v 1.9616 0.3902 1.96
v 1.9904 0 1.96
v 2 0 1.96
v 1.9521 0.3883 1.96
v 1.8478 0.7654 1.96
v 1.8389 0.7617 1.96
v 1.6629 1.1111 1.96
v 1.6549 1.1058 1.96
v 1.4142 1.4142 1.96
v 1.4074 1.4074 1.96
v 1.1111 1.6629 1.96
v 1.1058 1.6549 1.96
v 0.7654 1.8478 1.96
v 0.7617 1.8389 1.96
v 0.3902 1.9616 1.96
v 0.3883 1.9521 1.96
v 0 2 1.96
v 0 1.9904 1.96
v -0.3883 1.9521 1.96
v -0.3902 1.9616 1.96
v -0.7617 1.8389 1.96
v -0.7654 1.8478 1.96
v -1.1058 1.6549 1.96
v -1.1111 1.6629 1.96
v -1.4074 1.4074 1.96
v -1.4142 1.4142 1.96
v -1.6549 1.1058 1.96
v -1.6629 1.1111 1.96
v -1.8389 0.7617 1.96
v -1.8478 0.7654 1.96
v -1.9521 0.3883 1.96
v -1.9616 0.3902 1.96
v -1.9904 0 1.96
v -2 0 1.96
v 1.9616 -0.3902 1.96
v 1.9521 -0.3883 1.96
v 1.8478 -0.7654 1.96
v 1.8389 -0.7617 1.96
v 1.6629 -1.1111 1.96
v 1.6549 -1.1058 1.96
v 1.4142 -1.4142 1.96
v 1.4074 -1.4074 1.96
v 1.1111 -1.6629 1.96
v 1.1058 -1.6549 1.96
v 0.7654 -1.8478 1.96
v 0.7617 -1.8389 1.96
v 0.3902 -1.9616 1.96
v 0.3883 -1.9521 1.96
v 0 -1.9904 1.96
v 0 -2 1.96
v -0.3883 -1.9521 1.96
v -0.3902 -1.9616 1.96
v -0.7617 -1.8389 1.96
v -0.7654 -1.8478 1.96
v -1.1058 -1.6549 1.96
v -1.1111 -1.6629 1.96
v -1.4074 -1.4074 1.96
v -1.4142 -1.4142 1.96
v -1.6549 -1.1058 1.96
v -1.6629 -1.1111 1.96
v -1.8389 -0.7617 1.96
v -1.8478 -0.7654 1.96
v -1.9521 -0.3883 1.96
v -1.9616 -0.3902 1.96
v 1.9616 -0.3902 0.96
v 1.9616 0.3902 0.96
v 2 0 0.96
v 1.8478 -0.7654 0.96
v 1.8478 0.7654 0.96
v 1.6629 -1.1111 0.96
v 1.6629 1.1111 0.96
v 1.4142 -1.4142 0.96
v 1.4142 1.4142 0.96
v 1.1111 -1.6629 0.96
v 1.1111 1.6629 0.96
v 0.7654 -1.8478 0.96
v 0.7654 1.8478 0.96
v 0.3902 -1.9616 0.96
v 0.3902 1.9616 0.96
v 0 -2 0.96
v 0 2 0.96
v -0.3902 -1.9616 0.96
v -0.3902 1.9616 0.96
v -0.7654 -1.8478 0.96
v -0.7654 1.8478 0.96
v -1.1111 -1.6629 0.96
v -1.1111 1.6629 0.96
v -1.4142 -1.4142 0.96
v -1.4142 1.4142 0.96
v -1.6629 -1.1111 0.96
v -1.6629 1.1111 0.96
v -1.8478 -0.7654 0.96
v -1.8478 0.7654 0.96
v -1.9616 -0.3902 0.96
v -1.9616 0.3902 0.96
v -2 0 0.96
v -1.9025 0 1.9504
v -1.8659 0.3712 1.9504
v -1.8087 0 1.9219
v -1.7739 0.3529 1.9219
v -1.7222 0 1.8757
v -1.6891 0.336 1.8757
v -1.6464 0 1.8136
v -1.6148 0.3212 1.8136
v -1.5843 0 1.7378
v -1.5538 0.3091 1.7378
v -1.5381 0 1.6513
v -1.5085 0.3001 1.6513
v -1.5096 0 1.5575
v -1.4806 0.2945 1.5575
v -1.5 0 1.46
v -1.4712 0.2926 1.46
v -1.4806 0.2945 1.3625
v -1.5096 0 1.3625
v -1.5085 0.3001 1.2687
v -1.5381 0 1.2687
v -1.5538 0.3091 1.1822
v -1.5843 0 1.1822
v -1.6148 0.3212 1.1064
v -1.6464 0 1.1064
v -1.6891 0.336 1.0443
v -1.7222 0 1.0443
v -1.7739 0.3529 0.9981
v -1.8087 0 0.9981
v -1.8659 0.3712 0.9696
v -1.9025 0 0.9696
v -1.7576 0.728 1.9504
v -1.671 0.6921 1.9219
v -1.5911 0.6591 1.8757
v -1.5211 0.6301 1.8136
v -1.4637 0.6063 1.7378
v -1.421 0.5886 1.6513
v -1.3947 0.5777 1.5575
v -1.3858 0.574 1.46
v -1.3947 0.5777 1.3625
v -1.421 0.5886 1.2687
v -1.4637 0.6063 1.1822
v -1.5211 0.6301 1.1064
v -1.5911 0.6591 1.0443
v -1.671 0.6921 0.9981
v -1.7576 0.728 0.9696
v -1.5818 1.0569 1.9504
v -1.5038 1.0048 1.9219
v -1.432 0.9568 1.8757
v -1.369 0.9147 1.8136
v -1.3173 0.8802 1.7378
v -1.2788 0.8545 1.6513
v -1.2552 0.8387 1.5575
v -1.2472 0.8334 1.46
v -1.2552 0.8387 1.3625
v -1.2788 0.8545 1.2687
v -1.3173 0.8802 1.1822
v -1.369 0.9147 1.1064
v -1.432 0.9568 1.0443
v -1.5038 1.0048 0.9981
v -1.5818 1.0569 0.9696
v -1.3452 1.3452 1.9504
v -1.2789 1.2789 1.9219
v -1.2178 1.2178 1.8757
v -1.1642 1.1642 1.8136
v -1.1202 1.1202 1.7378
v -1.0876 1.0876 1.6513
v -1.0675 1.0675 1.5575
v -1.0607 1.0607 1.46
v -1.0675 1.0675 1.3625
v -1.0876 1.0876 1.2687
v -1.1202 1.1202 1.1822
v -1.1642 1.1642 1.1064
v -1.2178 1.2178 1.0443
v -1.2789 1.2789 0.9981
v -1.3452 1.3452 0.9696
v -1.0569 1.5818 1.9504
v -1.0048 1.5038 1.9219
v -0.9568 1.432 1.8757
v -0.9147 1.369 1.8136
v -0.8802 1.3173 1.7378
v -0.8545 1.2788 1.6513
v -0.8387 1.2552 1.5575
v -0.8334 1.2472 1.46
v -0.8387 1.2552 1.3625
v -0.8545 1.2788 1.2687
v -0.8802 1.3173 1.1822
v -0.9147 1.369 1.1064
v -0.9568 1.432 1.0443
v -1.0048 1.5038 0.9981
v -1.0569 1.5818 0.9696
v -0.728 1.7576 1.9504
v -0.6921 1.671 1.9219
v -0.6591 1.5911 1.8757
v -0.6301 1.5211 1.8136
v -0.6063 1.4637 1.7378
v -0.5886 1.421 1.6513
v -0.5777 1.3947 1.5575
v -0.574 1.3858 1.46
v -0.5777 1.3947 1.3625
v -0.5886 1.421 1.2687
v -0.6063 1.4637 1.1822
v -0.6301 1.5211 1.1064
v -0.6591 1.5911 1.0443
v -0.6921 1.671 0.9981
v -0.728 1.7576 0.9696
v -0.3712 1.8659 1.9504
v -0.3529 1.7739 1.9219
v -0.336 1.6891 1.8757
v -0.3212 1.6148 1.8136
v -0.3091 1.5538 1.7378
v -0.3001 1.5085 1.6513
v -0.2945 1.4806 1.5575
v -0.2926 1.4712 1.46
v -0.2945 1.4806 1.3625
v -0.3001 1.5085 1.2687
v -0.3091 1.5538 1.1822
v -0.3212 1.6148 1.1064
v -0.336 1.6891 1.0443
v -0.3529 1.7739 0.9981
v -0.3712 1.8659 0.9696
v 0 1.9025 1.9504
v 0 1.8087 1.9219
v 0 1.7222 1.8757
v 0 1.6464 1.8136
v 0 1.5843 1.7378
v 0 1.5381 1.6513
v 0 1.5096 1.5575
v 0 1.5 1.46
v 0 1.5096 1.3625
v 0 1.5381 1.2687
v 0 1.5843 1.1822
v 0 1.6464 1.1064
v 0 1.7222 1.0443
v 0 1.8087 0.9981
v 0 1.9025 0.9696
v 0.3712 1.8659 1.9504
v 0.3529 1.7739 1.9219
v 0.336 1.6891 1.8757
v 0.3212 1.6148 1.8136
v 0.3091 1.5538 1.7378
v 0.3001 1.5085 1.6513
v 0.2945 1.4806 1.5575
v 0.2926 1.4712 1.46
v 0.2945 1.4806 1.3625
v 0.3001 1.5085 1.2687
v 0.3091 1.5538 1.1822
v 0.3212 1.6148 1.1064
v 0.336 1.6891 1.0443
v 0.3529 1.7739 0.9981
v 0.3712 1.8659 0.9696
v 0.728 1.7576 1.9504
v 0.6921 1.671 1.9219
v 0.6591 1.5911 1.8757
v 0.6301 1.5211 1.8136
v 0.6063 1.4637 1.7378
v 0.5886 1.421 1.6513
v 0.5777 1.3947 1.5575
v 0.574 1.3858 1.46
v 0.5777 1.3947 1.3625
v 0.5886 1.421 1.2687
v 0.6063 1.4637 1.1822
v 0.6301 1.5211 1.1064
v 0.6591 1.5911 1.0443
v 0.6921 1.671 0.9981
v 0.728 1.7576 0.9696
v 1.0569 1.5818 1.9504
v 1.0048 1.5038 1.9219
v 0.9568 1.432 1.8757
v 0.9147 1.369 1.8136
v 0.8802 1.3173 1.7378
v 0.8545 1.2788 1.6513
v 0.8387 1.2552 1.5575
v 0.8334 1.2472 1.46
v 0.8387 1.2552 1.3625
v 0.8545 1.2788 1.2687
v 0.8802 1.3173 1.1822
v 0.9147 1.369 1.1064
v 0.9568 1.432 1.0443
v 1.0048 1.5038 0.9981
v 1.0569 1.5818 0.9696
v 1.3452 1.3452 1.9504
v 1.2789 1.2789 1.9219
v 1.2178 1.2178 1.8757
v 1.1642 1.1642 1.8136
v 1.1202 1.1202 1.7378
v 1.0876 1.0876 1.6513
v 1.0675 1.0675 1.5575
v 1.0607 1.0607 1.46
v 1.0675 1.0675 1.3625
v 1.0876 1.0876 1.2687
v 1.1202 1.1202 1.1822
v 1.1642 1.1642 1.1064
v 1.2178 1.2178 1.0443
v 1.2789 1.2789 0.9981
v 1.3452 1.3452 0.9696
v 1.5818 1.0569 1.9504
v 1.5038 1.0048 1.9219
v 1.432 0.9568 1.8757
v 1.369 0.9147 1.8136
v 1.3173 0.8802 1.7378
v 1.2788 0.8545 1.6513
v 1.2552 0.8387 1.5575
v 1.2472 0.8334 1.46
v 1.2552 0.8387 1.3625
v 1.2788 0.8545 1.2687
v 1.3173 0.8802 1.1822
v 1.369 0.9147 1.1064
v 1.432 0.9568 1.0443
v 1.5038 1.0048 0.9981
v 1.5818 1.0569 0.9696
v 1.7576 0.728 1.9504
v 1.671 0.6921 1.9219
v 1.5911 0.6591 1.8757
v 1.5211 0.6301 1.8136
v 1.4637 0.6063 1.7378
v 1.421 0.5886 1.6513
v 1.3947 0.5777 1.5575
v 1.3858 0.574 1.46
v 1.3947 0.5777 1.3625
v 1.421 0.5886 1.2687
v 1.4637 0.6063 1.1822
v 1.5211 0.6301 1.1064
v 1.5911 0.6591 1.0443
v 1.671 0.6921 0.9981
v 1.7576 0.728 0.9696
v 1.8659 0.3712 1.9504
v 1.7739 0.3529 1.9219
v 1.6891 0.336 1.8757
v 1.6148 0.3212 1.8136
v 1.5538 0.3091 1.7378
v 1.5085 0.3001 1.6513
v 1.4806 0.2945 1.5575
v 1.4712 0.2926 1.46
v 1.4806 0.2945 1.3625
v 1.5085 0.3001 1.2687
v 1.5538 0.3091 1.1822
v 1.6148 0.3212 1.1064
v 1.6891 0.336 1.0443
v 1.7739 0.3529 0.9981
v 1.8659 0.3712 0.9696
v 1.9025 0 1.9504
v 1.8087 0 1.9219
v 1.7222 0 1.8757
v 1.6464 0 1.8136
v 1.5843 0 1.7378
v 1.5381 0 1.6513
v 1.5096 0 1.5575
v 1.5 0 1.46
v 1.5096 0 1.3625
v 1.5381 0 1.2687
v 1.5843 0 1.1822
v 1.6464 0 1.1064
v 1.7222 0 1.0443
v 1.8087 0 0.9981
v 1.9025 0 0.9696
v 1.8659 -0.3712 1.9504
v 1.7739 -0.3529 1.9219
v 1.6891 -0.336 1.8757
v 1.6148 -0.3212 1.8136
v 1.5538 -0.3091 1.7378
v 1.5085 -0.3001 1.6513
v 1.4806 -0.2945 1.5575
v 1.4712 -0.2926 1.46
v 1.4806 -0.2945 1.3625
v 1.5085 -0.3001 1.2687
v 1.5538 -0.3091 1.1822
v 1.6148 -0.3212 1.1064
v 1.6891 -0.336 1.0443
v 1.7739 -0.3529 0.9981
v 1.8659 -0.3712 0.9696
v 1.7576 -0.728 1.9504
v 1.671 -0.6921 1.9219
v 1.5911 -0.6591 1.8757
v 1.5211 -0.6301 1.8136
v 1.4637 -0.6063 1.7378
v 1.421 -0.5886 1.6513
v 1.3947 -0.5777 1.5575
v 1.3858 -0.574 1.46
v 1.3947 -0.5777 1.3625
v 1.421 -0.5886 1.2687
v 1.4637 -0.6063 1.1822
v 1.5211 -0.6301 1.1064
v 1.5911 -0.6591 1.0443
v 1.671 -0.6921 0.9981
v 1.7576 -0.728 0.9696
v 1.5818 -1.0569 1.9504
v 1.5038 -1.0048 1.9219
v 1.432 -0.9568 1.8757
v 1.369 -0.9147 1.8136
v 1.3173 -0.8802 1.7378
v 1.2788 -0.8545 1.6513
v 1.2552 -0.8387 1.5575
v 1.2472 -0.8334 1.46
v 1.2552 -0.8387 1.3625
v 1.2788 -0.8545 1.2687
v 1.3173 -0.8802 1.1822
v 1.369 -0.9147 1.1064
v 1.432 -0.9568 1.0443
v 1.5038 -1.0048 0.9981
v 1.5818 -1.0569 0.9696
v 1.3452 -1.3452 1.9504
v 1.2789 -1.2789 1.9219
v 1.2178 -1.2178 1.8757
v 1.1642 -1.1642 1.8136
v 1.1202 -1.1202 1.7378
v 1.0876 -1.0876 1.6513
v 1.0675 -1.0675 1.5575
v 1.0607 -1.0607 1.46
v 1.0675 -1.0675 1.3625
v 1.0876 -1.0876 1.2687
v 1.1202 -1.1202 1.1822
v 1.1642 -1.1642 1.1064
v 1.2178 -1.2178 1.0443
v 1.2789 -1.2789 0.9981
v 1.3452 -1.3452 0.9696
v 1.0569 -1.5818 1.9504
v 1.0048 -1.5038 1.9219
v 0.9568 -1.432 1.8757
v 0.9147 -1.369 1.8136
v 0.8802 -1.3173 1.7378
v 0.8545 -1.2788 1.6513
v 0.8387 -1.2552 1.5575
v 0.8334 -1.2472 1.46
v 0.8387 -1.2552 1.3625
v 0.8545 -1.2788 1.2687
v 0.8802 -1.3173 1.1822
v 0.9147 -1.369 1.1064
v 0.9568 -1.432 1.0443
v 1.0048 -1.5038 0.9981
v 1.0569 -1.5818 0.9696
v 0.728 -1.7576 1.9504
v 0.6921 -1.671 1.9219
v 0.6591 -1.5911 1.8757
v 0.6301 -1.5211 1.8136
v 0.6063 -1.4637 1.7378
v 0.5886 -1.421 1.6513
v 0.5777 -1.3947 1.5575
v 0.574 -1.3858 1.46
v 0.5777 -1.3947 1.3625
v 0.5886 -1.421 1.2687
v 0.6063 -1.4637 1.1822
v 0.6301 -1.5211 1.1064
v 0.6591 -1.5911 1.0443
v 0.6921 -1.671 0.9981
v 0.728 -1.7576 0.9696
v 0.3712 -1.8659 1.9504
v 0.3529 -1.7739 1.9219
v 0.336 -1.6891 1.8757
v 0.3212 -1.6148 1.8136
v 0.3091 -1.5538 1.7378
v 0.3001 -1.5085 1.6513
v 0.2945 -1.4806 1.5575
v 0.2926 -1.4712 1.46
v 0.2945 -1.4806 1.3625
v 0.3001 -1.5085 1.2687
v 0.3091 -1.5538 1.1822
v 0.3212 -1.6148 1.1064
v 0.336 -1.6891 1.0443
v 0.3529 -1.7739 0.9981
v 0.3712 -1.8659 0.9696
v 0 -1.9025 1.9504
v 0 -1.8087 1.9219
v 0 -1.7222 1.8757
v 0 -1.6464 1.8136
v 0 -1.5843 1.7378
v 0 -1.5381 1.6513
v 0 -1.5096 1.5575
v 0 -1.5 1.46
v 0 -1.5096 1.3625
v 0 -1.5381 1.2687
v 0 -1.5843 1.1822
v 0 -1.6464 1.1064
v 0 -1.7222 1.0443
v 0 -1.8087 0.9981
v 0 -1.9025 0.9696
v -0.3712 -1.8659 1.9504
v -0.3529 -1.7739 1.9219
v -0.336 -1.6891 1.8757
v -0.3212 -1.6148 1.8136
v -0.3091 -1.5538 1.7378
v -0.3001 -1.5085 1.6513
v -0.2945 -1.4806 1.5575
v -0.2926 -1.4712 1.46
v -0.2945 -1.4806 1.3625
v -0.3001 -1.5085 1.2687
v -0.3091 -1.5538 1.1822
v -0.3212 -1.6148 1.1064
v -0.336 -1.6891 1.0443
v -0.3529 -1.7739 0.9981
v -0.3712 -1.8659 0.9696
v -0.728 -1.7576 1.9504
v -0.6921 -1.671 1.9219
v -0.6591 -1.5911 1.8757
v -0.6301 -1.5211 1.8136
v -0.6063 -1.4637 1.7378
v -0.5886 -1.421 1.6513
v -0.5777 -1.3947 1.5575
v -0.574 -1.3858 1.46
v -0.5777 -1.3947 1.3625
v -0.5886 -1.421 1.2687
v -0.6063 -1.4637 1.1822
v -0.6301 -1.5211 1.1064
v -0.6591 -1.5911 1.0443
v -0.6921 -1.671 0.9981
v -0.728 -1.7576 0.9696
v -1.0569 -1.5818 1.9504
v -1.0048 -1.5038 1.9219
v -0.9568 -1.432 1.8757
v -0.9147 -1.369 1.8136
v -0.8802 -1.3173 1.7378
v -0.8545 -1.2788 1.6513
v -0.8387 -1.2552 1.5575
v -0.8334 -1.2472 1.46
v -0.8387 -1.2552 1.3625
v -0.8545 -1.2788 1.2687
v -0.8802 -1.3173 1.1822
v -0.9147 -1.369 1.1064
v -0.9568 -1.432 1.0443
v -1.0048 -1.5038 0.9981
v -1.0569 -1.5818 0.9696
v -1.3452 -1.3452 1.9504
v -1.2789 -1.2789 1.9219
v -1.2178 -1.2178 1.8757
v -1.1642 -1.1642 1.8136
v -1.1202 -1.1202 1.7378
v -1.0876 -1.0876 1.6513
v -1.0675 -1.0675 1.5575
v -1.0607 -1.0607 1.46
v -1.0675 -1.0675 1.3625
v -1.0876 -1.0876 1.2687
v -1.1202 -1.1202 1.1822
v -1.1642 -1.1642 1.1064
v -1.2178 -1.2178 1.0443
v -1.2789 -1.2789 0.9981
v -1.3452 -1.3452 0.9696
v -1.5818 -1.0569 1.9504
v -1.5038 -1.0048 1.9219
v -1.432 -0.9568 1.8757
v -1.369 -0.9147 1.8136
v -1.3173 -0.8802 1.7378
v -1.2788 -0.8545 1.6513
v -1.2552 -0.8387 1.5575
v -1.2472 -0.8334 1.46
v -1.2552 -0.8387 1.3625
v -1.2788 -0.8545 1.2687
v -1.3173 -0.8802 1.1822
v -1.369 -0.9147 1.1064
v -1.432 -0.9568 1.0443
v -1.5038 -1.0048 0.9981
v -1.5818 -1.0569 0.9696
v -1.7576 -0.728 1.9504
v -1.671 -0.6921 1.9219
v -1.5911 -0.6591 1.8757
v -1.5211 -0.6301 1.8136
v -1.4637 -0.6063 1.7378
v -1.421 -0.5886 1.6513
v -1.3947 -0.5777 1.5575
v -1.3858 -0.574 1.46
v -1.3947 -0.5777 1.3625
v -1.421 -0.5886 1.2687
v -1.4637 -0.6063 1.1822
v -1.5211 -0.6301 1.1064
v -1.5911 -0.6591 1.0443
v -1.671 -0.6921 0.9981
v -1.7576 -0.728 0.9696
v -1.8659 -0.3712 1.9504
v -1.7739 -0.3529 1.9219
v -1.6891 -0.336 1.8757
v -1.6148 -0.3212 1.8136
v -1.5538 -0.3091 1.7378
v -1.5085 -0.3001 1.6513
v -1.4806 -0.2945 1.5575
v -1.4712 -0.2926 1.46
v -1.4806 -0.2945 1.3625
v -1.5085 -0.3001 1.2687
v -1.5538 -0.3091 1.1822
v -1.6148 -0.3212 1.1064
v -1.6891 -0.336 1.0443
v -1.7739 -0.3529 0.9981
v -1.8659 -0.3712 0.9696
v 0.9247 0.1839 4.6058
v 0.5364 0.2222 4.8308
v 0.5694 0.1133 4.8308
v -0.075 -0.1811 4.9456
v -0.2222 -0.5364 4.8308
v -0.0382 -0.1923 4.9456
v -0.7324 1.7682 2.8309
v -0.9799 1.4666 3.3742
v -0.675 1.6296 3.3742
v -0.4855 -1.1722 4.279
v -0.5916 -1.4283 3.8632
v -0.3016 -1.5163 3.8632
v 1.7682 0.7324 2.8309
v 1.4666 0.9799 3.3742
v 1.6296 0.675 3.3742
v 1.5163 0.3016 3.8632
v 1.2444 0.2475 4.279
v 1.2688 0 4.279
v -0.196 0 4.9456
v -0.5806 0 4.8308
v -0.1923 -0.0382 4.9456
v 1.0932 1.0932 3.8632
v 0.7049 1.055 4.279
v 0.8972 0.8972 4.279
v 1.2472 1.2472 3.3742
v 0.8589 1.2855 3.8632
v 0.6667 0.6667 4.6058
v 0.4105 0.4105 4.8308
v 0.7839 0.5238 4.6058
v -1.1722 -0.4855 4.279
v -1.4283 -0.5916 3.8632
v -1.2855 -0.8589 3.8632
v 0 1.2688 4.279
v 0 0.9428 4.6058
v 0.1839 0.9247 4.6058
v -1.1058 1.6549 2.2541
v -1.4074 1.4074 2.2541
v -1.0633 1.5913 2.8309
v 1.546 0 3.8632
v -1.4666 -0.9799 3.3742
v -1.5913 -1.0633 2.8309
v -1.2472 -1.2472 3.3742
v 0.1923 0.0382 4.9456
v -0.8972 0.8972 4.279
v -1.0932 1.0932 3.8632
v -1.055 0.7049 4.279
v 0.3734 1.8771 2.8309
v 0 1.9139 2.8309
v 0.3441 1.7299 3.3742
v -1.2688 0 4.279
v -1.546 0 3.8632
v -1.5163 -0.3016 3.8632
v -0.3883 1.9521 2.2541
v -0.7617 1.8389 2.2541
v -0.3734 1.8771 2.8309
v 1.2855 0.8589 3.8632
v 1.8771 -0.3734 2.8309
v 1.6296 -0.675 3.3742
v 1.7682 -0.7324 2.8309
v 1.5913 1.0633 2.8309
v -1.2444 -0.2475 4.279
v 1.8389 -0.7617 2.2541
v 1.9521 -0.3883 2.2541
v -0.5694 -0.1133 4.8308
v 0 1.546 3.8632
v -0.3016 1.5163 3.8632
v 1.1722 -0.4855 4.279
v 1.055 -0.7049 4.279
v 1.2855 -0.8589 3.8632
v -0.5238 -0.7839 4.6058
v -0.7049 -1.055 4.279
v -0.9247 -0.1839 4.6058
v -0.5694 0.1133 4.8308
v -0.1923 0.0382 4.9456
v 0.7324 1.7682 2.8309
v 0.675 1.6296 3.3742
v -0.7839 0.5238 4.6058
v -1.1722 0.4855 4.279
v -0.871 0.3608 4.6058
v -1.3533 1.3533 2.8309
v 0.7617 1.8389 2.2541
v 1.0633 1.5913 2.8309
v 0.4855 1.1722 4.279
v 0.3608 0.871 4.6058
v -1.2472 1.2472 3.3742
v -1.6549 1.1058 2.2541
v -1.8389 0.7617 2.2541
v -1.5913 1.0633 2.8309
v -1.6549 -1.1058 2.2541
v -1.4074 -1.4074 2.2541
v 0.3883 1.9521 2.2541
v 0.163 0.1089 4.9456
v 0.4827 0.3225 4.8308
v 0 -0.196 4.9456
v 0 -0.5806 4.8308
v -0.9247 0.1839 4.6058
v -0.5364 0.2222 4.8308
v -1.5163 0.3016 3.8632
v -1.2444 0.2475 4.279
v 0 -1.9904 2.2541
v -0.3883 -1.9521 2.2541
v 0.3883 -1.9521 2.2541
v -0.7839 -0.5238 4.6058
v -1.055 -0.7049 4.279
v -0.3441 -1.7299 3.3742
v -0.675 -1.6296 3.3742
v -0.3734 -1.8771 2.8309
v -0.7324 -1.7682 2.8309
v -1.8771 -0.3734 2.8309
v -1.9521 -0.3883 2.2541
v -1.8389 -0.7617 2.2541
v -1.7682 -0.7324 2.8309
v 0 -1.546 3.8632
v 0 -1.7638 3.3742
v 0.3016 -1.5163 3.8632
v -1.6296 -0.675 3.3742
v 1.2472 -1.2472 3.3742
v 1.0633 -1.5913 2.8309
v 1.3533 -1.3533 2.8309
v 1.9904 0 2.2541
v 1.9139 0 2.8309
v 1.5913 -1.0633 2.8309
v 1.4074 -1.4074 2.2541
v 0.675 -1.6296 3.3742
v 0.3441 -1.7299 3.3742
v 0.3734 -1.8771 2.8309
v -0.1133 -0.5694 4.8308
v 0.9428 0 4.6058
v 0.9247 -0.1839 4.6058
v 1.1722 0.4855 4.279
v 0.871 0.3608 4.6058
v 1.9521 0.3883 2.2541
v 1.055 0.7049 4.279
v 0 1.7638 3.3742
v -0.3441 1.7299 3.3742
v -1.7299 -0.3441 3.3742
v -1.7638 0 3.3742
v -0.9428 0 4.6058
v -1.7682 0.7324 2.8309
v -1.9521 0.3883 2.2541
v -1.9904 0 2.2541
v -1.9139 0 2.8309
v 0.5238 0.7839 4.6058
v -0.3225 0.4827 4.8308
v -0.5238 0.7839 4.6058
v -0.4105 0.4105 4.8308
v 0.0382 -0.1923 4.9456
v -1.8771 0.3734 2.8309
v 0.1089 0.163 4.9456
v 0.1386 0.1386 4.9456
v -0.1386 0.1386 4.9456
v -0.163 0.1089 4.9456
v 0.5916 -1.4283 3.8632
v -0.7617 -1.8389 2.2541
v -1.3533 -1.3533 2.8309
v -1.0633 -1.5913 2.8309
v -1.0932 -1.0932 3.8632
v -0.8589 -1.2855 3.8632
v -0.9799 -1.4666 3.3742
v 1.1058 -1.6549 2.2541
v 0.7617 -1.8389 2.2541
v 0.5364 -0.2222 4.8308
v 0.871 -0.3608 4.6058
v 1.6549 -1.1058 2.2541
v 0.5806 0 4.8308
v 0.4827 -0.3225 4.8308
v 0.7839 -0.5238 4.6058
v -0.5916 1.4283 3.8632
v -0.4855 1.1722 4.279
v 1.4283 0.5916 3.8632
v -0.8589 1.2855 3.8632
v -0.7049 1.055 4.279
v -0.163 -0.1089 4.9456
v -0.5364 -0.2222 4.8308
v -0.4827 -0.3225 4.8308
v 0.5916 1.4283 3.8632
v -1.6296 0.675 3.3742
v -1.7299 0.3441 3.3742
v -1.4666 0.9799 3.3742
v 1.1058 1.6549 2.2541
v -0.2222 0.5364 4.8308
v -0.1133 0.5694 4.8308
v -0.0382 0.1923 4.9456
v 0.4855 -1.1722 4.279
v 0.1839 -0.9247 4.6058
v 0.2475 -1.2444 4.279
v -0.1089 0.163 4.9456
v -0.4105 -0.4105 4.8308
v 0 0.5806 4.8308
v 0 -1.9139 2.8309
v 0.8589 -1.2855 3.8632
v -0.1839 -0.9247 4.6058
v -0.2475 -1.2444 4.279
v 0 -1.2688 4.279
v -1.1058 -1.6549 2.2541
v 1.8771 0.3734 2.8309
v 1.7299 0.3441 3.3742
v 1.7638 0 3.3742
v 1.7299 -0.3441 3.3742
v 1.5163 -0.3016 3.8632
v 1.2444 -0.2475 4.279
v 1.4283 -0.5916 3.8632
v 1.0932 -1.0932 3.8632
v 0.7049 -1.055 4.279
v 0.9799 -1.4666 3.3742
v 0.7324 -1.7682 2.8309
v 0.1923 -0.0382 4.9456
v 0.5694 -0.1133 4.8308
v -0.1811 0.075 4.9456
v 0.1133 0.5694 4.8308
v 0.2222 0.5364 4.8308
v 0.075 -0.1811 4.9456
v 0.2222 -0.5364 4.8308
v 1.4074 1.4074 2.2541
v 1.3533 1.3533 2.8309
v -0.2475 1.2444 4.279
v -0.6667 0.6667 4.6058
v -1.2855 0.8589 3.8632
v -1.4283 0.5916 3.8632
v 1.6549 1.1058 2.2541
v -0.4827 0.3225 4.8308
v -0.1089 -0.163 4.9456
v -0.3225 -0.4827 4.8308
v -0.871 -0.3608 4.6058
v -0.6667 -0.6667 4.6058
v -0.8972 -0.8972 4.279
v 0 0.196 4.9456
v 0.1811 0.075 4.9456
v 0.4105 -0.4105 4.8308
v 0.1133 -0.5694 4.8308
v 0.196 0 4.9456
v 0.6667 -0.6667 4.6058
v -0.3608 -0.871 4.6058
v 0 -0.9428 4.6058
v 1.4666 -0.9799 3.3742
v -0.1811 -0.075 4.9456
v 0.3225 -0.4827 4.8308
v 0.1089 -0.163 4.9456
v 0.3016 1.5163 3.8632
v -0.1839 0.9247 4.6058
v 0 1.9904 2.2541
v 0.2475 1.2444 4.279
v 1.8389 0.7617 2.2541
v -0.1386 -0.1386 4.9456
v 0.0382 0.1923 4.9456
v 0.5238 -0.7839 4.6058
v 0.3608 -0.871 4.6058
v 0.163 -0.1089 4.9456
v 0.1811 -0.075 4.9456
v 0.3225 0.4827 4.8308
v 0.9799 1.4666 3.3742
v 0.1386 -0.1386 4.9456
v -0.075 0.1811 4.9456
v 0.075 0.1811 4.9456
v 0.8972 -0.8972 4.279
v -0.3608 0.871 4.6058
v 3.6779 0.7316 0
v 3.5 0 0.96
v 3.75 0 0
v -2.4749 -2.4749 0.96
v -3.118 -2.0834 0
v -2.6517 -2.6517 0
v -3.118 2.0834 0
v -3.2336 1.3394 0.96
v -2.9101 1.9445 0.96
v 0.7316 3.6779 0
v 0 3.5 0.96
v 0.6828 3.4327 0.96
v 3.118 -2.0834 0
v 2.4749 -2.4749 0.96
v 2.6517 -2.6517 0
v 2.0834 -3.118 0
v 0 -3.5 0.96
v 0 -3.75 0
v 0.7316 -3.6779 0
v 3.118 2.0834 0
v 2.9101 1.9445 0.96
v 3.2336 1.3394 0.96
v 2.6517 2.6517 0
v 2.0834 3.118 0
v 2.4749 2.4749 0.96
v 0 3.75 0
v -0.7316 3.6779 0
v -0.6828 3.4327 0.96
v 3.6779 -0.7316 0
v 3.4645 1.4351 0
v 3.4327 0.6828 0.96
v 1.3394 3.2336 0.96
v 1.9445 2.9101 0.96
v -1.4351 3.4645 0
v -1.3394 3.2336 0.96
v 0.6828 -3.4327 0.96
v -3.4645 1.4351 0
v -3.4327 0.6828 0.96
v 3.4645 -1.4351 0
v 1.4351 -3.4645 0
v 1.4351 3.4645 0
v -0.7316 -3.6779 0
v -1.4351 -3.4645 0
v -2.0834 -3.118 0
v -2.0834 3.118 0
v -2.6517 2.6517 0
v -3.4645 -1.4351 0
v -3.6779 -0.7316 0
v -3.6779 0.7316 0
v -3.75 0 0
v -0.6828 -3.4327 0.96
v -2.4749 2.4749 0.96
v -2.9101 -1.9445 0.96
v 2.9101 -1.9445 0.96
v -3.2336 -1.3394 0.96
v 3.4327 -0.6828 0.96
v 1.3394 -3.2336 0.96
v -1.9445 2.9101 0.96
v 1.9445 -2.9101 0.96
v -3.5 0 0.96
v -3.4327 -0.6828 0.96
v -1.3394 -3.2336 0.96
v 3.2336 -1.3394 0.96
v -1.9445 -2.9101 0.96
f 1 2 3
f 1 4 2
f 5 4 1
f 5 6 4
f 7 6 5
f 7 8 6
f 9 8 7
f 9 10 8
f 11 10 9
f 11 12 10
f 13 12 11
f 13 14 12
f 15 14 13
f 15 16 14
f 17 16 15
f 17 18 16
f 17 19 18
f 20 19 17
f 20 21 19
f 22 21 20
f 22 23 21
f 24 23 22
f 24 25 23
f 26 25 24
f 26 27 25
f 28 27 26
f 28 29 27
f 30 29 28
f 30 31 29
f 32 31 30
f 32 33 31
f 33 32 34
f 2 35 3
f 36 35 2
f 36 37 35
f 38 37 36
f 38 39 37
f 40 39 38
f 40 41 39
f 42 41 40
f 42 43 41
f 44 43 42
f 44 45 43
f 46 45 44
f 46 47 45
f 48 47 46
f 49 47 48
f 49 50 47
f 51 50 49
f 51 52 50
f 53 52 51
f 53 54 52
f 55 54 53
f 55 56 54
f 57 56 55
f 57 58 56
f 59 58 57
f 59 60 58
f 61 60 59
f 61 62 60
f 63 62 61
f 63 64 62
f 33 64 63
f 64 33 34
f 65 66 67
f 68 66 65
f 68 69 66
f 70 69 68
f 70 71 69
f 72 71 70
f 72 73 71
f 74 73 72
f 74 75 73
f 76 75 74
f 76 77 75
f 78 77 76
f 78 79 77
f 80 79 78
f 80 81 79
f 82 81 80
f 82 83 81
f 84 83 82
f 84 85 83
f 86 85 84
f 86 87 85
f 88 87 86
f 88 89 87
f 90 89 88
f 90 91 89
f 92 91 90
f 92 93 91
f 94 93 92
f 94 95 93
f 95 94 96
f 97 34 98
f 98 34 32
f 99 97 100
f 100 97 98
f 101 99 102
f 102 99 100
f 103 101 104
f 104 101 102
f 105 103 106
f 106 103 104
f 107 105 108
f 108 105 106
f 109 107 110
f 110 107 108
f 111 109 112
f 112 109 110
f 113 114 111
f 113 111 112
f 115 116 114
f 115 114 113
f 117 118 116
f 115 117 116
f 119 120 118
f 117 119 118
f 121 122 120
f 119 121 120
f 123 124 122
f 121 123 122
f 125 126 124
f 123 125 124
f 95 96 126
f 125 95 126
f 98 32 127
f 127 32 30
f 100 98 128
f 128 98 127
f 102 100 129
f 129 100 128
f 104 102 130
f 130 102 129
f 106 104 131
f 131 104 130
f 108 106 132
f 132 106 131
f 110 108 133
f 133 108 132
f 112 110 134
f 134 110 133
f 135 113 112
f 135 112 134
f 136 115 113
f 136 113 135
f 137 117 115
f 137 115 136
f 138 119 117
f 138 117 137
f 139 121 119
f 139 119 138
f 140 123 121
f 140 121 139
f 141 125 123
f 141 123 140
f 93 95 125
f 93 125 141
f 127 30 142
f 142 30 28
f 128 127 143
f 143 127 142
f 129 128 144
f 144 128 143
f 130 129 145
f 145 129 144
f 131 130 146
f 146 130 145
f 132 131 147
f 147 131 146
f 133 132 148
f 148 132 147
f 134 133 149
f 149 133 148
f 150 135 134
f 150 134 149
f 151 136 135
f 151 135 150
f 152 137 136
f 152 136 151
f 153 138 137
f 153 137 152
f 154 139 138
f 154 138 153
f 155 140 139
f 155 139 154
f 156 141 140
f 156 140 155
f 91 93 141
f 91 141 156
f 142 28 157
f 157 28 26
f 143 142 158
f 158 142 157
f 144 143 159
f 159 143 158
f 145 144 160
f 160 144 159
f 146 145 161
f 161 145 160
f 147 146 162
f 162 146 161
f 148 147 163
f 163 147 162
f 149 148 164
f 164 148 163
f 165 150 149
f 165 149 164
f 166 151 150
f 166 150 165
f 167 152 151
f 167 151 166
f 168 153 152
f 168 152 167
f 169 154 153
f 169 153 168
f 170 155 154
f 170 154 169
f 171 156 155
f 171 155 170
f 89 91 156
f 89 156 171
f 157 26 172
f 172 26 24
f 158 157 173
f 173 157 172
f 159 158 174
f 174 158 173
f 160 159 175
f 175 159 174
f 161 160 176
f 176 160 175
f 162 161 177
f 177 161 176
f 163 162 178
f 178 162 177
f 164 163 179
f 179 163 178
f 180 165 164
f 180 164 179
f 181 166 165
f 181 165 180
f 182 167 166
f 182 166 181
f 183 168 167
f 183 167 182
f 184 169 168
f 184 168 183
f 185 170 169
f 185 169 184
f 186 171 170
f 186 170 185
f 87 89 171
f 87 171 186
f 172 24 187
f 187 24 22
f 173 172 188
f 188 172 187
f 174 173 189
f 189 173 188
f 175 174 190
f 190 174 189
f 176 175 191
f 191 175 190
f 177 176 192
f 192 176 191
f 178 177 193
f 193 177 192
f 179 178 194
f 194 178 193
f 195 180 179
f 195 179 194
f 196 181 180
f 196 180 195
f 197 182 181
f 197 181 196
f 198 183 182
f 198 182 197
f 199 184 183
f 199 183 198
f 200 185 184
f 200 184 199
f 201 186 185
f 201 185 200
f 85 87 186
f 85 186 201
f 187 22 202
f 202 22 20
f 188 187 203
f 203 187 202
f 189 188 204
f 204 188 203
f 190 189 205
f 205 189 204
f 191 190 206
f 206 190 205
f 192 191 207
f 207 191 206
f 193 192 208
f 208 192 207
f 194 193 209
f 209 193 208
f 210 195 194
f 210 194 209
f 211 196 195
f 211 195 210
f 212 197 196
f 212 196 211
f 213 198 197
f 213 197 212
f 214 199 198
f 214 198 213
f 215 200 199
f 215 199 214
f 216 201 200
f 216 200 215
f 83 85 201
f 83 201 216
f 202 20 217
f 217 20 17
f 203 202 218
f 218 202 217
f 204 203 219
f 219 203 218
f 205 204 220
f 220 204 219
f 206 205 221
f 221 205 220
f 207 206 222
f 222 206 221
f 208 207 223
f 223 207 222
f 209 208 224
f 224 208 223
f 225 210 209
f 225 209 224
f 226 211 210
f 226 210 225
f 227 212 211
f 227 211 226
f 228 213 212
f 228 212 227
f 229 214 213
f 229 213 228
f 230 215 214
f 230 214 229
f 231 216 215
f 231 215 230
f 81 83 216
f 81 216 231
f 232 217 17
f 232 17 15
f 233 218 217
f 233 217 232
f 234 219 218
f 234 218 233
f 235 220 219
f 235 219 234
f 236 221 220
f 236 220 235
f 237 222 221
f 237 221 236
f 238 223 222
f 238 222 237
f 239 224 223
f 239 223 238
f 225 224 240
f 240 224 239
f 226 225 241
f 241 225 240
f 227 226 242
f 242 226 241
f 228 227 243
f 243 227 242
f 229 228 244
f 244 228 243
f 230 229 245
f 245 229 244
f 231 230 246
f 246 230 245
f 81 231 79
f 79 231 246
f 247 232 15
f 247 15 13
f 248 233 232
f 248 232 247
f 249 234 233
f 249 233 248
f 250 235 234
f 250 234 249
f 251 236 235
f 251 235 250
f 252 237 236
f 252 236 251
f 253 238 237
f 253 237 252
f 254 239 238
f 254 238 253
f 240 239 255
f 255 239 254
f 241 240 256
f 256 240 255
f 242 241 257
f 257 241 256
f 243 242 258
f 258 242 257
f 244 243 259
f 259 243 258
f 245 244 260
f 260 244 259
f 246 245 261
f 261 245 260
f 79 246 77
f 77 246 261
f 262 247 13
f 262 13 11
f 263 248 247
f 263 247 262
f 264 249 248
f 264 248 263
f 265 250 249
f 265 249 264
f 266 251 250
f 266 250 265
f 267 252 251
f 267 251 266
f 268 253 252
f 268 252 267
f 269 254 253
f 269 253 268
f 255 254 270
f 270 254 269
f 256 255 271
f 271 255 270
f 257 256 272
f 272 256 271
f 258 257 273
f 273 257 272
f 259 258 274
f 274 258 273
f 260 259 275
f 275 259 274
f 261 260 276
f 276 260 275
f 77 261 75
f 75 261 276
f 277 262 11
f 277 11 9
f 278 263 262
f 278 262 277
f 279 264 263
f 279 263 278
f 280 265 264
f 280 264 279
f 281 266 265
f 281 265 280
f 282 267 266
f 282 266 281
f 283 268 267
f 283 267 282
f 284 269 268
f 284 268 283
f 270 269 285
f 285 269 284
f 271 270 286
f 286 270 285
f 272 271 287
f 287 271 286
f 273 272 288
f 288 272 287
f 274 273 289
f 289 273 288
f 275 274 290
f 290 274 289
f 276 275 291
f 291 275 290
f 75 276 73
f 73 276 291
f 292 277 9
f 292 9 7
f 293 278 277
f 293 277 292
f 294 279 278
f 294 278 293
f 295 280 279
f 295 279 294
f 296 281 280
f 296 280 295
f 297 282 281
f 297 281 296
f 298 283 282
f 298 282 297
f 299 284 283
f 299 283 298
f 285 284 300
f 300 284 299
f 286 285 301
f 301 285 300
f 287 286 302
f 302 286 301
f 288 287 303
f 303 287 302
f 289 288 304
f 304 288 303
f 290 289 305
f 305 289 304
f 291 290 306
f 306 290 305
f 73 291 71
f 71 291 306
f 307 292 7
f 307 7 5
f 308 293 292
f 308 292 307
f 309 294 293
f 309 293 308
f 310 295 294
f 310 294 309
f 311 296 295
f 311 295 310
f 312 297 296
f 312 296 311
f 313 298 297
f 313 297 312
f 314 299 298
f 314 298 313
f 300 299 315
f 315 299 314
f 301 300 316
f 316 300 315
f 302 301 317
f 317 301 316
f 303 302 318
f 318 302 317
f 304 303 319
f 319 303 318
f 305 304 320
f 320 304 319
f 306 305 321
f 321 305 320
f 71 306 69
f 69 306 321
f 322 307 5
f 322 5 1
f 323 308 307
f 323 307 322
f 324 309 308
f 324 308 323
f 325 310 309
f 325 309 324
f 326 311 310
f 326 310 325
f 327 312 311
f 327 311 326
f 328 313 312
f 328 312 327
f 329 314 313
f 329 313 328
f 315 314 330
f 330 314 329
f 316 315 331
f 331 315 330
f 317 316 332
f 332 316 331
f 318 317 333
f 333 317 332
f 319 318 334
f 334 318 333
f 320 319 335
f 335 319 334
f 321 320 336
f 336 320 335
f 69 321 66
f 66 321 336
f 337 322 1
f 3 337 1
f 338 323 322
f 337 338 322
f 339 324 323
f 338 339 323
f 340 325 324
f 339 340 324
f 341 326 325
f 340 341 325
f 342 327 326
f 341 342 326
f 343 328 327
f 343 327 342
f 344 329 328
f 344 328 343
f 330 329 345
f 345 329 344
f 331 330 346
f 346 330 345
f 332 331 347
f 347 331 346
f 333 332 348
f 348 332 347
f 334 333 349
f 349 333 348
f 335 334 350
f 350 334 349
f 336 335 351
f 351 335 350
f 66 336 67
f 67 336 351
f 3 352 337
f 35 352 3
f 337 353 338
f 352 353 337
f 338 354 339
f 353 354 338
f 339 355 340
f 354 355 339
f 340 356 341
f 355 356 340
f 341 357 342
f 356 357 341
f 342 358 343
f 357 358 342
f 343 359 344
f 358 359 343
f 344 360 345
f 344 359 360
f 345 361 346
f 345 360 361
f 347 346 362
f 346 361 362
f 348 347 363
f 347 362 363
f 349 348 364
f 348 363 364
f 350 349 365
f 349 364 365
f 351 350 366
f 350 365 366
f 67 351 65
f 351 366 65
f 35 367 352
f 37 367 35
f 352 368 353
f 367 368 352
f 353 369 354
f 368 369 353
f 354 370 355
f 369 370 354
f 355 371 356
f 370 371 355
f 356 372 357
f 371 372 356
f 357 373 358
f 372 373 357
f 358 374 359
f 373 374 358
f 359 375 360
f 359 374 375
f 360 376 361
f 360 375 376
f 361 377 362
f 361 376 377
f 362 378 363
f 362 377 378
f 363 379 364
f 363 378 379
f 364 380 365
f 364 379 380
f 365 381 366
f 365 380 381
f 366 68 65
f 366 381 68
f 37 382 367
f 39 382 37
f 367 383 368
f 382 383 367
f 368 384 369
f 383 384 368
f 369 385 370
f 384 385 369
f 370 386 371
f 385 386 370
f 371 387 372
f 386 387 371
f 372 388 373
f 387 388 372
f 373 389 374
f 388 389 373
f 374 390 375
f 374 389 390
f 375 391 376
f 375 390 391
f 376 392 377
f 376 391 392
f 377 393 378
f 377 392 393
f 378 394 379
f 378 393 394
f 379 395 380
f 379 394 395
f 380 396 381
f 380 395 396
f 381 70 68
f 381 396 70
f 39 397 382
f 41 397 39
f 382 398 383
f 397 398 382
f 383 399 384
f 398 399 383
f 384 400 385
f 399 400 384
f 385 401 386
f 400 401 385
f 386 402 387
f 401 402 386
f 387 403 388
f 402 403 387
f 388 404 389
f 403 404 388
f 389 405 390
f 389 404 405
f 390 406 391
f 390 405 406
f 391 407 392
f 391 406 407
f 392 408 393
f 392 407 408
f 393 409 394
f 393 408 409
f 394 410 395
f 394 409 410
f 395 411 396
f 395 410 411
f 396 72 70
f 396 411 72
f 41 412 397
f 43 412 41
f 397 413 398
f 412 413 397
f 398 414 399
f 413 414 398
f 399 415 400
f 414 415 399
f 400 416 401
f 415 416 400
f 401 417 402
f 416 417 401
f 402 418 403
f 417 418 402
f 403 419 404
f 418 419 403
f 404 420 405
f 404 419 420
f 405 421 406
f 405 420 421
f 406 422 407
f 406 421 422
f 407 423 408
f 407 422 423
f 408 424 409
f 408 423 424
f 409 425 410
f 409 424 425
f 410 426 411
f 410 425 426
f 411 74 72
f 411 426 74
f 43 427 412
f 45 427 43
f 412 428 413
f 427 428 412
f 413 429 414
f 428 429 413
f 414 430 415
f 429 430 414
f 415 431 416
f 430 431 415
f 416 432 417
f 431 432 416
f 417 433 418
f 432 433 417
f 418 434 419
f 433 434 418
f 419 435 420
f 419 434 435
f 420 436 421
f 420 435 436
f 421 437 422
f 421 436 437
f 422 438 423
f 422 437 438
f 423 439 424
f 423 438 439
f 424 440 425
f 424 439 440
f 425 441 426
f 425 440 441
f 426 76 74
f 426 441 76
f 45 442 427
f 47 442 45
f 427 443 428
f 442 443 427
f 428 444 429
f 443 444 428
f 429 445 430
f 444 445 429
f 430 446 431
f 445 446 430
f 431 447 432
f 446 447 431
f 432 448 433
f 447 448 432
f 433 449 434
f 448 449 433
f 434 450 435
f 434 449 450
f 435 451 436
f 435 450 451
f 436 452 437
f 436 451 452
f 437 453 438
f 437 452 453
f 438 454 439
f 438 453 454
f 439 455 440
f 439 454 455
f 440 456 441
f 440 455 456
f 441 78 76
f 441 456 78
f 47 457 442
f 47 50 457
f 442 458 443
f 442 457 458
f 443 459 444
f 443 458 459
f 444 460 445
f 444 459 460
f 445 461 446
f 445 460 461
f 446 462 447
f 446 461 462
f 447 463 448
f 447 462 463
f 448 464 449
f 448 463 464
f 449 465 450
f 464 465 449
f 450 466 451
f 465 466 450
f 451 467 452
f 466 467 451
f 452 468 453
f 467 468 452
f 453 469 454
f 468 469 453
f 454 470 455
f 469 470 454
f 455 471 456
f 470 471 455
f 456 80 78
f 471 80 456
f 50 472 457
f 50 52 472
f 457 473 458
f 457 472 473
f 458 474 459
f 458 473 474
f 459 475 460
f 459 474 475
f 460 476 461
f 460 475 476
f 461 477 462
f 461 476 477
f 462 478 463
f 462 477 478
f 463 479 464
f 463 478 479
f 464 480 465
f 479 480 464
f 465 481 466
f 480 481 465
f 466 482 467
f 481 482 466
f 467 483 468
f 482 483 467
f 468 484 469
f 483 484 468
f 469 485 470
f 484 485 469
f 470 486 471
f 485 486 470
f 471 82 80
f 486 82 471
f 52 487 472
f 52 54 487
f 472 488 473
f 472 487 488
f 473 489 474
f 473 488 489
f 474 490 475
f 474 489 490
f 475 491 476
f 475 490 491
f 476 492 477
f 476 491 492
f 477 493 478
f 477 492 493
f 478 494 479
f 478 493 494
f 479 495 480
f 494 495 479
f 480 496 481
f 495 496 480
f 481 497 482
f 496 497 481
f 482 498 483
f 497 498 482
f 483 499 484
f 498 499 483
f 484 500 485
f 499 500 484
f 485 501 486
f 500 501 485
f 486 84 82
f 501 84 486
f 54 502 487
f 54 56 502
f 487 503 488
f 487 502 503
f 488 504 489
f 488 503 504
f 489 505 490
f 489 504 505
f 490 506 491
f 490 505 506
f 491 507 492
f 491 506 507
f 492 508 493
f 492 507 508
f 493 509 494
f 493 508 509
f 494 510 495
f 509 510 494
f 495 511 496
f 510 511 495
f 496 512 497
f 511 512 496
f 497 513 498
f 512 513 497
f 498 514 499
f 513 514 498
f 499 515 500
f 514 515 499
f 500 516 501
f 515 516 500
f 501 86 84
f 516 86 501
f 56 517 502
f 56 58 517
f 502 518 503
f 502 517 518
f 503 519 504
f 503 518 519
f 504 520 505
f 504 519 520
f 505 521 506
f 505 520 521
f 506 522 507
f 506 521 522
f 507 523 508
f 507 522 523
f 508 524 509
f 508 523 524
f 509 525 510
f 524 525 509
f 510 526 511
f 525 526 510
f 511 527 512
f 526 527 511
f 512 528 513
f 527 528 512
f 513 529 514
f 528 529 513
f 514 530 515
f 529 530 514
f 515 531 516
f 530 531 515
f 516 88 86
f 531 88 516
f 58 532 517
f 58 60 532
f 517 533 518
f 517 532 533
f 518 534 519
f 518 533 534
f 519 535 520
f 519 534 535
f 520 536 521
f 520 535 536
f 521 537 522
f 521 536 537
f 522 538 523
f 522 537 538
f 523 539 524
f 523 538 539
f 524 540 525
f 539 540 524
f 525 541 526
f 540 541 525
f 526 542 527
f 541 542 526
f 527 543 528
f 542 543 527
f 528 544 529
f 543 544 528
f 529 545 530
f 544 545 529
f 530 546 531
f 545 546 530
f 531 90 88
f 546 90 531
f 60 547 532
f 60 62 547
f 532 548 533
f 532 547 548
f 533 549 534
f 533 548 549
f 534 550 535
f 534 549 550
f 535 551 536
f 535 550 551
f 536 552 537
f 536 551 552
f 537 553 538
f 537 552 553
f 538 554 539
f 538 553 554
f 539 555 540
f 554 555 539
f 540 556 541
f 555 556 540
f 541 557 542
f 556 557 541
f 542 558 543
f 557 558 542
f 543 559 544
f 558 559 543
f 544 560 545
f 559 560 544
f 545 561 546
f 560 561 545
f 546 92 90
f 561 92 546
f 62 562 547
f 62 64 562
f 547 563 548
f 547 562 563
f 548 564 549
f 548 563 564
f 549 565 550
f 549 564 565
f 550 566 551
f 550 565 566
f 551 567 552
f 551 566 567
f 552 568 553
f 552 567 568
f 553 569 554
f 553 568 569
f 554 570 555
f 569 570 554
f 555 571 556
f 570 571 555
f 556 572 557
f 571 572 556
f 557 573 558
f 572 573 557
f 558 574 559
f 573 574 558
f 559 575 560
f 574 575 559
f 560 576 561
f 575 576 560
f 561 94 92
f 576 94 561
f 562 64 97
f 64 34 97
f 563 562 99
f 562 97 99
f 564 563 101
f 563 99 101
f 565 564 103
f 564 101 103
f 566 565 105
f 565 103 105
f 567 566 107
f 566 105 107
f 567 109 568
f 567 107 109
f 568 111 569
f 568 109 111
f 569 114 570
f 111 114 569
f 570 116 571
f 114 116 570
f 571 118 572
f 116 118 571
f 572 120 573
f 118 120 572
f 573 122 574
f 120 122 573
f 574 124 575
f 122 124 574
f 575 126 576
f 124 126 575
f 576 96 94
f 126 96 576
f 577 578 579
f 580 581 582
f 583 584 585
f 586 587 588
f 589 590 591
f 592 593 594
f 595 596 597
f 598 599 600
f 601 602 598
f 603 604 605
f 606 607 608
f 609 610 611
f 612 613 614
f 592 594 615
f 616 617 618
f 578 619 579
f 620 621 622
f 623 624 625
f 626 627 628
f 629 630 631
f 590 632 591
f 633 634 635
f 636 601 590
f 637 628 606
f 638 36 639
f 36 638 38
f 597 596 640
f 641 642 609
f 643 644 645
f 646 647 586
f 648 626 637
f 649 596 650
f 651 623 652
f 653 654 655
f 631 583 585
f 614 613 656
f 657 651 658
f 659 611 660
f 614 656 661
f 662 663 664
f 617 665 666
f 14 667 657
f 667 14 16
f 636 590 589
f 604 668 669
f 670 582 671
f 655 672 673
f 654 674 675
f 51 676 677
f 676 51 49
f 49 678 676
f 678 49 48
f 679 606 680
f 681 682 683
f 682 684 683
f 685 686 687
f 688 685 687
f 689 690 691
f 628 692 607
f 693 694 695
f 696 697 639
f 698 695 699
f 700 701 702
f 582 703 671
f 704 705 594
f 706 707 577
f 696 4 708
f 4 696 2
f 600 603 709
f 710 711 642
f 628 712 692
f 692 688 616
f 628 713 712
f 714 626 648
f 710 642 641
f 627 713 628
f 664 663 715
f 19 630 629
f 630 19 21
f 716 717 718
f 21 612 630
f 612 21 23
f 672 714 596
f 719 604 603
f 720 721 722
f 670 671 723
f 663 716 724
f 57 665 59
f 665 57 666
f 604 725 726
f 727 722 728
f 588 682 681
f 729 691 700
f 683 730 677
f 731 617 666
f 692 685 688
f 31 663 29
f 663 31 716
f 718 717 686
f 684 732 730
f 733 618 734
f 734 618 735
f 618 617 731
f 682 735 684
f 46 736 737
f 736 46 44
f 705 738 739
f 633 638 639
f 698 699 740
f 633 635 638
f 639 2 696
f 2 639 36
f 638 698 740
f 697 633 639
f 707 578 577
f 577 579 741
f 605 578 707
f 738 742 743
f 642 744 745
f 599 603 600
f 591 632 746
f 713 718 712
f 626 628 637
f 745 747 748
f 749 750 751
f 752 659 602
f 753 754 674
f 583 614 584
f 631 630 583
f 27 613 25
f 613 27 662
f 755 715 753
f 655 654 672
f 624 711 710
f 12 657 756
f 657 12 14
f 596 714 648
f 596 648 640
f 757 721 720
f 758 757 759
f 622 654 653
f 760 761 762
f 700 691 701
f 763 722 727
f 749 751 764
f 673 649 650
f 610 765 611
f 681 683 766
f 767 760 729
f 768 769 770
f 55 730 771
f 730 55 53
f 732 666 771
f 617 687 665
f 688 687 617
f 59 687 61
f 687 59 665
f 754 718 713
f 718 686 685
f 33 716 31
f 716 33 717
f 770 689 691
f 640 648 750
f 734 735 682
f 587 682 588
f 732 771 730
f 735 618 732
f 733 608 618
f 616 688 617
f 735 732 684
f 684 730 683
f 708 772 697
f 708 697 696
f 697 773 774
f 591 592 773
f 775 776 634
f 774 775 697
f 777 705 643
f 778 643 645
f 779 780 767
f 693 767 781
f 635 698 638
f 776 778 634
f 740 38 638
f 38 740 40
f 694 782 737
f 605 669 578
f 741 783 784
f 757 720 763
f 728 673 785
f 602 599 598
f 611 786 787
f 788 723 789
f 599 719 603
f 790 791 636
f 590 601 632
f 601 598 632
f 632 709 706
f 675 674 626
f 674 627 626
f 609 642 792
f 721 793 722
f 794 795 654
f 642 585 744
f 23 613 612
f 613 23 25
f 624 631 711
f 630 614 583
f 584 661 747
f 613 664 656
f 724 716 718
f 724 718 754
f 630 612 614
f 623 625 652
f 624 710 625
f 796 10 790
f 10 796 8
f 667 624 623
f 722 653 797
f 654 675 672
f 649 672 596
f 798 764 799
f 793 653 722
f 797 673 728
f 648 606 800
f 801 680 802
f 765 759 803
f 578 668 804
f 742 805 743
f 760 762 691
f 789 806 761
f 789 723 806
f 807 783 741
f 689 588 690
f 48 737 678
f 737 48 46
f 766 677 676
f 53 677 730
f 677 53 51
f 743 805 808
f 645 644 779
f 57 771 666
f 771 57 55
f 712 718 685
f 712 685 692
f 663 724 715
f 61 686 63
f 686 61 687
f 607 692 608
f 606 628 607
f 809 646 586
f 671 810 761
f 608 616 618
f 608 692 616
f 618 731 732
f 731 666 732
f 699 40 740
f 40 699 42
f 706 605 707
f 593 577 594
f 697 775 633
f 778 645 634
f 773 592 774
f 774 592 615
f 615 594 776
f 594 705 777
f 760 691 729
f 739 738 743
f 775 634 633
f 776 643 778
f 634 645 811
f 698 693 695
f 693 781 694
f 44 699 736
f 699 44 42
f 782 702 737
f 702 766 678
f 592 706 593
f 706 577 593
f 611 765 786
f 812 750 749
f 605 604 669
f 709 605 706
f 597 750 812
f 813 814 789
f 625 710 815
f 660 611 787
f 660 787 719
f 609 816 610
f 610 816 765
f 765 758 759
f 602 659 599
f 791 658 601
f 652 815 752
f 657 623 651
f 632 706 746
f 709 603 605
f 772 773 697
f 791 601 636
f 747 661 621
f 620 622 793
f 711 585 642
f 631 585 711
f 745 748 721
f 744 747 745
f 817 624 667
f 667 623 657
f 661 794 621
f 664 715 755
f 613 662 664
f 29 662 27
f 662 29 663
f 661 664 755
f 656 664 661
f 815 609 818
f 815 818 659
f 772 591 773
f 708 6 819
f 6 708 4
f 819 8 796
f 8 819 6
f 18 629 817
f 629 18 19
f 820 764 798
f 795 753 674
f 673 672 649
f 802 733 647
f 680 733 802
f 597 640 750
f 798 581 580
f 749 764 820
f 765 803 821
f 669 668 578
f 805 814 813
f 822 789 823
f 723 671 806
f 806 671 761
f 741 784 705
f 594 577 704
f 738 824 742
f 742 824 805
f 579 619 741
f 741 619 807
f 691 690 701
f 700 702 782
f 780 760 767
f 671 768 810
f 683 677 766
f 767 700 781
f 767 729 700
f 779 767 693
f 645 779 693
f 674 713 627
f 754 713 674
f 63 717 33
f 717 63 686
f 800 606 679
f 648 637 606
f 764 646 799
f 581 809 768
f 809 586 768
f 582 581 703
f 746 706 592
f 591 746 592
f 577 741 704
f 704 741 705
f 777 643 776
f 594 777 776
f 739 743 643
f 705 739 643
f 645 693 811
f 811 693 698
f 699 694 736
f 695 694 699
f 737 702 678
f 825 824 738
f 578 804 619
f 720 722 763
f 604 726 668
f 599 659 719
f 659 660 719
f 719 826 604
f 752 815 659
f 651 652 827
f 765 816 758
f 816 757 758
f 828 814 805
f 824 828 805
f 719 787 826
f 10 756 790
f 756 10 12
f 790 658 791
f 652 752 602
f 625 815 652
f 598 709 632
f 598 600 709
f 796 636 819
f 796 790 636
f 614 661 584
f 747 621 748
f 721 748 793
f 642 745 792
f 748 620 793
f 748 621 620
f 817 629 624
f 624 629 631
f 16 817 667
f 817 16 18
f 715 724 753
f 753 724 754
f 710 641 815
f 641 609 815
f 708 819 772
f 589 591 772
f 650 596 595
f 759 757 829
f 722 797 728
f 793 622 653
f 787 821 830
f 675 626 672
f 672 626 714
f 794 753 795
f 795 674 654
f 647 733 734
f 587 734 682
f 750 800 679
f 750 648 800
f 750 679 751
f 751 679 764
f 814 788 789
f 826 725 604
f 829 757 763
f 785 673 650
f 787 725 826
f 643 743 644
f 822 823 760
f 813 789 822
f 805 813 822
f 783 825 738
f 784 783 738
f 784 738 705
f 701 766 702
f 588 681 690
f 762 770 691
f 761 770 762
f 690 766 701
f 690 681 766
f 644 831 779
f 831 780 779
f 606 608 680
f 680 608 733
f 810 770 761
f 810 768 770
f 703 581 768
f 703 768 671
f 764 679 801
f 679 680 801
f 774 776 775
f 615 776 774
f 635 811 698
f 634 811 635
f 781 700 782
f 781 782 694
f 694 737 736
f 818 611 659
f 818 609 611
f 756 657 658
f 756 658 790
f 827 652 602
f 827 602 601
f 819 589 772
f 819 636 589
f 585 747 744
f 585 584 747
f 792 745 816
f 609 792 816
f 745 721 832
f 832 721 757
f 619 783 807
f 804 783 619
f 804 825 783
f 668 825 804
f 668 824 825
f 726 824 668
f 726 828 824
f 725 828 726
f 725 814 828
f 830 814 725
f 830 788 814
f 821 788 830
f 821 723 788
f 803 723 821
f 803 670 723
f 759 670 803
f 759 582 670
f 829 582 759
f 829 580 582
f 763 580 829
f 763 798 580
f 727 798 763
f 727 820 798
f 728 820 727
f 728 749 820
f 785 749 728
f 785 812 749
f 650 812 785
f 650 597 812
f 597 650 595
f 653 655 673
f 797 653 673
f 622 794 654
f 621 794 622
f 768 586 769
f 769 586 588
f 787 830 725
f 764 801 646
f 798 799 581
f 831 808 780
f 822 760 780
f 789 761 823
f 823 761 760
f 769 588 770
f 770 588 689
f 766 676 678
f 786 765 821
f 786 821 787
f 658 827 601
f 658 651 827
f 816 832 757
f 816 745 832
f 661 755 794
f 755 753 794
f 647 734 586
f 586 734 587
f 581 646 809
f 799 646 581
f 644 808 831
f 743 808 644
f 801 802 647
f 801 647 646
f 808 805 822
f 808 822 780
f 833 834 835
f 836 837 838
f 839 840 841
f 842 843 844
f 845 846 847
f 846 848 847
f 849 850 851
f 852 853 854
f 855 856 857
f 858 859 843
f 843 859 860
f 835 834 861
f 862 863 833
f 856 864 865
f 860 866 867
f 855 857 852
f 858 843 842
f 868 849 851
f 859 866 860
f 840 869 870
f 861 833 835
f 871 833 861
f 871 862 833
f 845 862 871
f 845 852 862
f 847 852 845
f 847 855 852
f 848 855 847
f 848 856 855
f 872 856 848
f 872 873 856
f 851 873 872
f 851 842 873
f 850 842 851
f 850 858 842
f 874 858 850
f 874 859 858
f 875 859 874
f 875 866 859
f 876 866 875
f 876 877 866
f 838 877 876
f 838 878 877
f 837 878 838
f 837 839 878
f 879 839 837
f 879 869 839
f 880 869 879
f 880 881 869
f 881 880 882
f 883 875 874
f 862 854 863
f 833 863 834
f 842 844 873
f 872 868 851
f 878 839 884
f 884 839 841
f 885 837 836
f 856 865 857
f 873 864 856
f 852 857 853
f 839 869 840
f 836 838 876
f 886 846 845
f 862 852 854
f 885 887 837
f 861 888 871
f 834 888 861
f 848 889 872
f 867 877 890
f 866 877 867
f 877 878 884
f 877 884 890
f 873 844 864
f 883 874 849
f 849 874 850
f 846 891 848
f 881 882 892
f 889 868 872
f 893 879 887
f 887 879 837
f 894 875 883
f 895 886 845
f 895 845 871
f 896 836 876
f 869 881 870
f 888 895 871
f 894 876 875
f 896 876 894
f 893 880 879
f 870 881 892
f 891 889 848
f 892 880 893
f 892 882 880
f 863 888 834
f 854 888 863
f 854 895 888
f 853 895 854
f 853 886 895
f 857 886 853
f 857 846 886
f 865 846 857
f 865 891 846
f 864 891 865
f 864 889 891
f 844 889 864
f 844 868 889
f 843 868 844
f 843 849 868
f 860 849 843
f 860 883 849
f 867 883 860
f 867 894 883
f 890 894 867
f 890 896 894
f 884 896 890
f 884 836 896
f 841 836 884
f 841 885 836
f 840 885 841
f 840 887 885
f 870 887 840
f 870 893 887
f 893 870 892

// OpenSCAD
stemIR=2;
stemOR=0.5;
baseR=3.75;
$fn=32;




cylinder(r1=baseR, r2=baseR-0.25,h=0.96);
translate([0,0,0.96]) stem();
translate([0,0,0.96+stemOR*2]) plug();

module plug() {
  scale([1,1,1.5]) intersection() {
    sphere(r=stemIR);
    cylinder(r=stemIR,h=stemIR);
  }
}

module stem() {
  difference() {
    cylinder(r=stemIR,h=stemOR*2);
    translate([0,0,stemOR]) torus(stemIR,stemOR);
  }
}


module torus(r1,r2) {
  rotate_extrude(convexity = 10, $fn=$fn)
    translate([r1, 0, 0])
    circle(r = r2, $fn=$fn);
}
